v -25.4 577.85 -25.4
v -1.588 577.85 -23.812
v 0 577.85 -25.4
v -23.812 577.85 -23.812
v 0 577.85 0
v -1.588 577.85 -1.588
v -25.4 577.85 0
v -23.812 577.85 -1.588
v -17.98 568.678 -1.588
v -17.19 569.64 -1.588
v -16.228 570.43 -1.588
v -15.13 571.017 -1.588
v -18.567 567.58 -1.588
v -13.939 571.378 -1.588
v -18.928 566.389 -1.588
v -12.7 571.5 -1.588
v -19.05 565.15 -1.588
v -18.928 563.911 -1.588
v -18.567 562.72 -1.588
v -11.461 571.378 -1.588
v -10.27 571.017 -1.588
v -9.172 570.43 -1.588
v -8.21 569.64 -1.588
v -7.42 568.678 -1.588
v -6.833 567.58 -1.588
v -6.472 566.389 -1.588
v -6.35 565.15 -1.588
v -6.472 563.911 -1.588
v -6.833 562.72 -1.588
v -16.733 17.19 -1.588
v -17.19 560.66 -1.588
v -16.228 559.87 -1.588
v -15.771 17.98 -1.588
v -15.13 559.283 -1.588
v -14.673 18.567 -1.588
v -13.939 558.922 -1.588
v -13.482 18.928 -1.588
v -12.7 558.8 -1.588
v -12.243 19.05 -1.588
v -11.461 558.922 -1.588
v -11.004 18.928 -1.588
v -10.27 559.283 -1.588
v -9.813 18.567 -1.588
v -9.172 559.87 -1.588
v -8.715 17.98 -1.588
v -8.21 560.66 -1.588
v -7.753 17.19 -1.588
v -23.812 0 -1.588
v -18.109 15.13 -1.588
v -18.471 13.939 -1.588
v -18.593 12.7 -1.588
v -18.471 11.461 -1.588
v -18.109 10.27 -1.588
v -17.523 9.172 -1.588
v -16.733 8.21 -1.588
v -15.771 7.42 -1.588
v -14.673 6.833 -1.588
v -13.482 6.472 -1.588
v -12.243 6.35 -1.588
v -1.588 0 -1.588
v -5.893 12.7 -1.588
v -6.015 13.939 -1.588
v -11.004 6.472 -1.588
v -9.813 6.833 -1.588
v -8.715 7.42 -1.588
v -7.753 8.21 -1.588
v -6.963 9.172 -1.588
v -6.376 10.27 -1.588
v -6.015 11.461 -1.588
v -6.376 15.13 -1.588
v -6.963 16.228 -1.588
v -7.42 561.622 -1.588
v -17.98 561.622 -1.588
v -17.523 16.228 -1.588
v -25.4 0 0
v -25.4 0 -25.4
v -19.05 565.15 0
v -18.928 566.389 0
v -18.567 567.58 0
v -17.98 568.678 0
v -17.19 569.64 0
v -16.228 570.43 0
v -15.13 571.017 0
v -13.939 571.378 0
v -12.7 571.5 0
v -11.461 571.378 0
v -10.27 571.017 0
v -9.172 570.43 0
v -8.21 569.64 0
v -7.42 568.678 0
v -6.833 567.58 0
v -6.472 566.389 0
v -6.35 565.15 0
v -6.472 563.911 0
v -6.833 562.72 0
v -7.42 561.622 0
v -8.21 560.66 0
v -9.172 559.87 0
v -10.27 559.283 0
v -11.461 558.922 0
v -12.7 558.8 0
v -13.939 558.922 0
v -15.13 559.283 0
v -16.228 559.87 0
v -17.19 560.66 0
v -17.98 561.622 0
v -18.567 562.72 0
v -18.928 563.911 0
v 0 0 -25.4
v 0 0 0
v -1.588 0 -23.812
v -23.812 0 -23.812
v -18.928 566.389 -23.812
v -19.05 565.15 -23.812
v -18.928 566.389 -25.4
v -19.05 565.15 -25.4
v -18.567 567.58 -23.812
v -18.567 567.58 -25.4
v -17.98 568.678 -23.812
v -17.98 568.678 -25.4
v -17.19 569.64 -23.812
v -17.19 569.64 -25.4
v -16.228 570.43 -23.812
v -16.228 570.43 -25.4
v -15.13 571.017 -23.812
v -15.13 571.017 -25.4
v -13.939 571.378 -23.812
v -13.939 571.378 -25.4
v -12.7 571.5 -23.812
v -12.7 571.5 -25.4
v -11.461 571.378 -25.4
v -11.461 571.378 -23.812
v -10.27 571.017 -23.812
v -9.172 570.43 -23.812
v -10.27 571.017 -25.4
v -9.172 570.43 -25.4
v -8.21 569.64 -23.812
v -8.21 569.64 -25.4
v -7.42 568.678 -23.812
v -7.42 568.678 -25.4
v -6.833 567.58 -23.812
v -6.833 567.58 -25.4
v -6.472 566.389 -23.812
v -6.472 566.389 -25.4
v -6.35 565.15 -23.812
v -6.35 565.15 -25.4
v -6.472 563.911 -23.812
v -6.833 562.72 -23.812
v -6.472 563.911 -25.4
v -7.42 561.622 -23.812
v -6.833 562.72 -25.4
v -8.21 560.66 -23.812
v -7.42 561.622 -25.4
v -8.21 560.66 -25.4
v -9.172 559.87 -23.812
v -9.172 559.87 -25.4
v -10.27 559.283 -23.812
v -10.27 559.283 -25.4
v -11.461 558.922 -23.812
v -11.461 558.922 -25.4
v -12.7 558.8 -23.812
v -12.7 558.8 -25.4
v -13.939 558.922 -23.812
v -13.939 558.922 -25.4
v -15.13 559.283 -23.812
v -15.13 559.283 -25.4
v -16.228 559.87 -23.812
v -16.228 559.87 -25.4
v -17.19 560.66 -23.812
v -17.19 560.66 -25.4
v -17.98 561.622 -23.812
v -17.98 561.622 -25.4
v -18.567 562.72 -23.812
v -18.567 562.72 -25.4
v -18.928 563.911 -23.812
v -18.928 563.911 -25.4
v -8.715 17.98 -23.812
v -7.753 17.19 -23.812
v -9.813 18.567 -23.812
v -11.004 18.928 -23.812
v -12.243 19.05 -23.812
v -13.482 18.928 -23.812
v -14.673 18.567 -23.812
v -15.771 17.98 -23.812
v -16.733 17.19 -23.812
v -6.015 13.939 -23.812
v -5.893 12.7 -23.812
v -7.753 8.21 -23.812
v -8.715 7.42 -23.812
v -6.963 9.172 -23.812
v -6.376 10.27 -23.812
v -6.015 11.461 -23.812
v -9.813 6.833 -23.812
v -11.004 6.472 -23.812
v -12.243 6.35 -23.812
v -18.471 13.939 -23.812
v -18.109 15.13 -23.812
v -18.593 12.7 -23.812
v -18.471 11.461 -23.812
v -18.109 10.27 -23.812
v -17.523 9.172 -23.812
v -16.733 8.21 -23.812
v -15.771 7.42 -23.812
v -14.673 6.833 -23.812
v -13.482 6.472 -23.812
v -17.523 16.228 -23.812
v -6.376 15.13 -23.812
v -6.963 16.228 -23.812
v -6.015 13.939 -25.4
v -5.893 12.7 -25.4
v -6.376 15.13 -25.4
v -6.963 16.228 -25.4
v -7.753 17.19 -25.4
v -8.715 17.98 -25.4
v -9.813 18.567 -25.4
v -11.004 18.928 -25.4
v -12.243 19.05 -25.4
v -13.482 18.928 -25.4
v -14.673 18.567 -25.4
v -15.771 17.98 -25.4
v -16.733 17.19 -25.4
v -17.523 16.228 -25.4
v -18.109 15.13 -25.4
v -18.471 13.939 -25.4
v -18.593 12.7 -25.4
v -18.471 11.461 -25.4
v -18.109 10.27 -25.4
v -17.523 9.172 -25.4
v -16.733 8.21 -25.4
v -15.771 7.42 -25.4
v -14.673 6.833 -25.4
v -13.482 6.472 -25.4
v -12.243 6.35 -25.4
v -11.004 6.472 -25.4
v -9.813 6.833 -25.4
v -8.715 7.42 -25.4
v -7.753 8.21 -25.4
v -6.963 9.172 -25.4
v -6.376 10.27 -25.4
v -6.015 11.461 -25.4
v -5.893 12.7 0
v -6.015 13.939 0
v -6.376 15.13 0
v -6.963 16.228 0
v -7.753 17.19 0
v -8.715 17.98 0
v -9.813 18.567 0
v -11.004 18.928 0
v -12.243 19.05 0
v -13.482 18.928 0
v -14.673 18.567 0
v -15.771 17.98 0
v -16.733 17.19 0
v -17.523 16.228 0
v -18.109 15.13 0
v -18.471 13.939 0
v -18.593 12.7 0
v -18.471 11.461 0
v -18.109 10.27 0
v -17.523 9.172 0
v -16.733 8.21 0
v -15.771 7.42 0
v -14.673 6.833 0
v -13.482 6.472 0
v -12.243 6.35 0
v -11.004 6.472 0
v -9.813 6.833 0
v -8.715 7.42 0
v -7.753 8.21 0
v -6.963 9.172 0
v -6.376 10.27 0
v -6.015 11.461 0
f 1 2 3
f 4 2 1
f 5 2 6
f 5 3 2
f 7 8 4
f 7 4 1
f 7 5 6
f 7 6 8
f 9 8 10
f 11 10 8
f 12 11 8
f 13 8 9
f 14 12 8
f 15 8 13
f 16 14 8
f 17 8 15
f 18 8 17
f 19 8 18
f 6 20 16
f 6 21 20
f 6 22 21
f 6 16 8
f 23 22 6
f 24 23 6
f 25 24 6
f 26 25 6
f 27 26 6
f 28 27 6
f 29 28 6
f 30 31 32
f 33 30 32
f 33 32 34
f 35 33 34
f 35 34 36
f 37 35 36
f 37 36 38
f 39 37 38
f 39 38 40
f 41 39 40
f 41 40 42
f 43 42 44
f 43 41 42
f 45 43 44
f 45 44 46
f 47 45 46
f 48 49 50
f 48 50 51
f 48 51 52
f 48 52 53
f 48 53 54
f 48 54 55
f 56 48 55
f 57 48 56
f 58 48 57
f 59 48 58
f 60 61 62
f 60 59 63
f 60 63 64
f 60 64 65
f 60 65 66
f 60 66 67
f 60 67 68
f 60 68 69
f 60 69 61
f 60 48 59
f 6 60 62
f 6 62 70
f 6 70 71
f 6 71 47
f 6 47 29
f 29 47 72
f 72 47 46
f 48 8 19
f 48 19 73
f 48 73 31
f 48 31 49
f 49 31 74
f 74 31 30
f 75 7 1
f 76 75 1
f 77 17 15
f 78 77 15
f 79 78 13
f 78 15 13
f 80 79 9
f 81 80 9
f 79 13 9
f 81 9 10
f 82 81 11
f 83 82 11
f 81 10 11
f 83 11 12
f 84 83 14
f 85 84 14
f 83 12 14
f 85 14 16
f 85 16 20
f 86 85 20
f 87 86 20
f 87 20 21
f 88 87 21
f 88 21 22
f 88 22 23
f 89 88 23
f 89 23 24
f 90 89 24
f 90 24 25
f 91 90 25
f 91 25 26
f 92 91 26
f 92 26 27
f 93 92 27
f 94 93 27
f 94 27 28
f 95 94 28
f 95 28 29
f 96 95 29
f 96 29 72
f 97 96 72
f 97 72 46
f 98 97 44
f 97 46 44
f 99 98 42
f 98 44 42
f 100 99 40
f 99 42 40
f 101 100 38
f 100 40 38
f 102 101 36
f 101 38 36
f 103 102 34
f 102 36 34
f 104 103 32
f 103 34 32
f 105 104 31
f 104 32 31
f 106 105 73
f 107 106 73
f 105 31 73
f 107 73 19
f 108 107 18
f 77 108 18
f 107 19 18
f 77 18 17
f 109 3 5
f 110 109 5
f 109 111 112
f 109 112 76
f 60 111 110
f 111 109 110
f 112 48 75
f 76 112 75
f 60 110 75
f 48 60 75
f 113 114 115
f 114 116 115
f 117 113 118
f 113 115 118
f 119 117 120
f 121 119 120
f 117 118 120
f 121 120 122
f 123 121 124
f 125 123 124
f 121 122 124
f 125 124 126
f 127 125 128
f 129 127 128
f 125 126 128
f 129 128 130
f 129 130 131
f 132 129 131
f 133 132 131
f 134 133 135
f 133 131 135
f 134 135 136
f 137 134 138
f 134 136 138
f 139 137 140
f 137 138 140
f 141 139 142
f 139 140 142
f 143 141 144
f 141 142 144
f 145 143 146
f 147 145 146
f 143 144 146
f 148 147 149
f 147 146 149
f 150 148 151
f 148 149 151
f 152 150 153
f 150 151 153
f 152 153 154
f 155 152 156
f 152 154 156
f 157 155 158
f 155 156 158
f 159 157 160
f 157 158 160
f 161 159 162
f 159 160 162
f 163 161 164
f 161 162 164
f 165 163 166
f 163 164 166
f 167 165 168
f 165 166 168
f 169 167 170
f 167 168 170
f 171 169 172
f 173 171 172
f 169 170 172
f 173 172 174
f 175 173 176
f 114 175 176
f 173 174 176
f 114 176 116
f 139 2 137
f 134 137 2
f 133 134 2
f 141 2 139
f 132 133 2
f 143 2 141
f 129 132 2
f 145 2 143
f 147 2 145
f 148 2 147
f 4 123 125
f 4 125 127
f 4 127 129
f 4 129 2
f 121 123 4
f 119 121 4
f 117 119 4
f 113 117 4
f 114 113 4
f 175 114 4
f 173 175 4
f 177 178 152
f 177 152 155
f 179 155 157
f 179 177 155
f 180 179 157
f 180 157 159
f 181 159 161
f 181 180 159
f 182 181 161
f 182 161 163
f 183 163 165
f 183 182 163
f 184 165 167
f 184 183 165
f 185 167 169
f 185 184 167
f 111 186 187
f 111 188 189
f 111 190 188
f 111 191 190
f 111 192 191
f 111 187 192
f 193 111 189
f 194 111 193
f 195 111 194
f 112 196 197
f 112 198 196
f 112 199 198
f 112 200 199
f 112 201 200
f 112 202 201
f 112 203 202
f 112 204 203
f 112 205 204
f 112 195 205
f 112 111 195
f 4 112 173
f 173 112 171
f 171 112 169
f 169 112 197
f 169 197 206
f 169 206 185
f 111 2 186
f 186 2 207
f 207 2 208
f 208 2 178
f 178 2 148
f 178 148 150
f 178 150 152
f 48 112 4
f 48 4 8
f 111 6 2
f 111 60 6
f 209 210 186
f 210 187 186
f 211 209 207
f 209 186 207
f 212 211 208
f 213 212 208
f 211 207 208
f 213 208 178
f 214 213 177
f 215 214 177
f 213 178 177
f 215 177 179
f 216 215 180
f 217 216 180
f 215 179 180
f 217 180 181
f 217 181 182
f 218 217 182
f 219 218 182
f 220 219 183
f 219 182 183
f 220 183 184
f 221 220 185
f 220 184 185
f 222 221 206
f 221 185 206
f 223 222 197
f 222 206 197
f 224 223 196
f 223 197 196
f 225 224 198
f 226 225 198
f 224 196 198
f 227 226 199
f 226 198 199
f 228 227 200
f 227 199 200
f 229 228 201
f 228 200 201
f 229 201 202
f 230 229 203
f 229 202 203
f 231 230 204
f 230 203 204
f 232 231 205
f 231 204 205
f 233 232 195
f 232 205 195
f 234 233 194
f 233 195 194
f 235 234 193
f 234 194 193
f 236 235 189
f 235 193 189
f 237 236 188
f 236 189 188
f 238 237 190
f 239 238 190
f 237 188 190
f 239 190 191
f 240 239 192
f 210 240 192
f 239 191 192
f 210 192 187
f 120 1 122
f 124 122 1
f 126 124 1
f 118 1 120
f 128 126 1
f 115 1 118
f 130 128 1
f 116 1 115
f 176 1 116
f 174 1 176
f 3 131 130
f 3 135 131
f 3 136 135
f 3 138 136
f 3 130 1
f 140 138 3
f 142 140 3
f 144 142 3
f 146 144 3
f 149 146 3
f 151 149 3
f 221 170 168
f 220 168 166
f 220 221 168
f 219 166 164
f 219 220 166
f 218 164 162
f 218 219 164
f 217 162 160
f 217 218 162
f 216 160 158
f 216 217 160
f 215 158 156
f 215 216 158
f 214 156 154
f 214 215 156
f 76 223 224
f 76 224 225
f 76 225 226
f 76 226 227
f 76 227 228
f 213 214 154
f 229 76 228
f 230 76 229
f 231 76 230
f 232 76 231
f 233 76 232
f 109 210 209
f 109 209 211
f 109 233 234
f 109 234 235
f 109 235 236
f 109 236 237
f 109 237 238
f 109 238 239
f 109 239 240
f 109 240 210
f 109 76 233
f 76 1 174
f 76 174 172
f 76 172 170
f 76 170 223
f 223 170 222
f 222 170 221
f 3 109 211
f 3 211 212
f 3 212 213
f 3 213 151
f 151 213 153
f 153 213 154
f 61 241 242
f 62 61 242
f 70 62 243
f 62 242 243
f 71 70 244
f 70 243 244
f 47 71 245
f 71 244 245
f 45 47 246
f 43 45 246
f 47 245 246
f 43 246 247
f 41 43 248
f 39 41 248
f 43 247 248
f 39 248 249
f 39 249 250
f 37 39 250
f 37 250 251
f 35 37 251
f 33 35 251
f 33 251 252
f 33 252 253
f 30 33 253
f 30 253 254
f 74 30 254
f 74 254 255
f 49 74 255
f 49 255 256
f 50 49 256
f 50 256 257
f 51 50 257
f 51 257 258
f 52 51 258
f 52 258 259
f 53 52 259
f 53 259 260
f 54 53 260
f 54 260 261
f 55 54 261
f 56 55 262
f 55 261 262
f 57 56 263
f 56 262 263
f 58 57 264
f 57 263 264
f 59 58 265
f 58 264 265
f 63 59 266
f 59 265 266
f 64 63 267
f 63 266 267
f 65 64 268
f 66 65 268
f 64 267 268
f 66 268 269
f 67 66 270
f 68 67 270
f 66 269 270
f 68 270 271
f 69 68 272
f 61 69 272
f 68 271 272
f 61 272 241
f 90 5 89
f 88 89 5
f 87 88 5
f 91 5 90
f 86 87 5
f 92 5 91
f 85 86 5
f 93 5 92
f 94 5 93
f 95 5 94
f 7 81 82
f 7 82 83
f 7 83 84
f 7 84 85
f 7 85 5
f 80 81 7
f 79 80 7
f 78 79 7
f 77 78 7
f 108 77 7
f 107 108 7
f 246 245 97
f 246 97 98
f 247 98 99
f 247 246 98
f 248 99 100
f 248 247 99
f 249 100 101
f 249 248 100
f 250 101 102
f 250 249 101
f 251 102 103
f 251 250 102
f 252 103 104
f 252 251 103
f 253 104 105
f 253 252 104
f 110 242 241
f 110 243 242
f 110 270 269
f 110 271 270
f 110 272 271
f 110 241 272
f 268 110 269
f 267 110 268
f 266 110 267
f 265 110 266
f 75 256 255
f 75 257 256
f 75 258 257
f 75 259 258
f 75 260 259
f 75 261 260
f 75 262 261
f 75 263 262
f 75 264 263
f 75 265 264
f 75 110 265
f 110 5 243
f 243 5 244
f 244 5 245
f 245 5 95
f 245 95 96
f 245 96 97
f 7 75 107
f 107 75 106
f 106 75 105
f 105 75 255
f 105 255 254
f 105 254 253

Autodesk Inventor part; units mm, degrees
ref_plane "YZ Plane" through (0, 0, 0) normal (1, 0, 0) x (0, 1, 0)
ref_plane "XZ Plane" through (0, 0, 0) normal (0, 1, 0) x (-1, 0, 0)
ref_plane "XY Plane" through (0, 0, 0) normal (0, 0, 1) x (1, 0, 0)
sketch "Sketch1" plane through (0, 0, 0) normal (0, 1, 0) x (-1, 0, 0)
  line L0 (0, 0) -> (25.4, 0)
  line L1 (25.4, 0) -> (25.4, -25.4)
  line L2 (25.4, -25.4) -> (0, -25.4)
  line L3 (0, -25.4) -> (0, 0)
  line L4 (23.8125, -23.8125) -> (23.8125, -1.5875)
  line L5 (23.8125, -1.5875) -> (1.5875, -1.5875)
  line L6 (1.5875, -1.5875) -> (1.5875, -23.8125)
  line L7 (1.5875, -23.8125) -> (23.8125, -23.8125)
  dimension "d0" = 25.4
  dimension "d1" = 25.4
  dimension "d2" = 1.5875
extrude "Extrusion1" add sketch "Sketch1" along normal blind 577.85
sketch "Sketch2" plane through (0, 0, -25.4) normal (0, 0, -1) x (-1, 0, 0)
  circle A0 centre (12.7, 565.15) radius 6.35
  line L0 (0, 577.85) -> (25.4, 577.85) projected
  point P0 (0, 0)
  dimension "d5" = 12.7
  dimension "d6" = 12.7
extrude "Extrusion2" cut sketch "Sketch2" against normal blind 25.4
sketch "Sketch4" plane through (-25.4, 0, 0) normal (0, 0, 1) x (1, 0, 0)
  circle A0 centre (13.1572, 12.7) radius 6.35
  line L0 (0, 0) -> (0, 577.85) projected
  line L1 (25.4, 0) -> (0, 0) projected
  dimension "d14" = 12.7
  dimension "d15" = 13.1572
  dimension "d16" = 12.7
extrude "Extrusion4" cut sketch "Sketch4" against normal blind 25.4
properties part number "AP 6"
